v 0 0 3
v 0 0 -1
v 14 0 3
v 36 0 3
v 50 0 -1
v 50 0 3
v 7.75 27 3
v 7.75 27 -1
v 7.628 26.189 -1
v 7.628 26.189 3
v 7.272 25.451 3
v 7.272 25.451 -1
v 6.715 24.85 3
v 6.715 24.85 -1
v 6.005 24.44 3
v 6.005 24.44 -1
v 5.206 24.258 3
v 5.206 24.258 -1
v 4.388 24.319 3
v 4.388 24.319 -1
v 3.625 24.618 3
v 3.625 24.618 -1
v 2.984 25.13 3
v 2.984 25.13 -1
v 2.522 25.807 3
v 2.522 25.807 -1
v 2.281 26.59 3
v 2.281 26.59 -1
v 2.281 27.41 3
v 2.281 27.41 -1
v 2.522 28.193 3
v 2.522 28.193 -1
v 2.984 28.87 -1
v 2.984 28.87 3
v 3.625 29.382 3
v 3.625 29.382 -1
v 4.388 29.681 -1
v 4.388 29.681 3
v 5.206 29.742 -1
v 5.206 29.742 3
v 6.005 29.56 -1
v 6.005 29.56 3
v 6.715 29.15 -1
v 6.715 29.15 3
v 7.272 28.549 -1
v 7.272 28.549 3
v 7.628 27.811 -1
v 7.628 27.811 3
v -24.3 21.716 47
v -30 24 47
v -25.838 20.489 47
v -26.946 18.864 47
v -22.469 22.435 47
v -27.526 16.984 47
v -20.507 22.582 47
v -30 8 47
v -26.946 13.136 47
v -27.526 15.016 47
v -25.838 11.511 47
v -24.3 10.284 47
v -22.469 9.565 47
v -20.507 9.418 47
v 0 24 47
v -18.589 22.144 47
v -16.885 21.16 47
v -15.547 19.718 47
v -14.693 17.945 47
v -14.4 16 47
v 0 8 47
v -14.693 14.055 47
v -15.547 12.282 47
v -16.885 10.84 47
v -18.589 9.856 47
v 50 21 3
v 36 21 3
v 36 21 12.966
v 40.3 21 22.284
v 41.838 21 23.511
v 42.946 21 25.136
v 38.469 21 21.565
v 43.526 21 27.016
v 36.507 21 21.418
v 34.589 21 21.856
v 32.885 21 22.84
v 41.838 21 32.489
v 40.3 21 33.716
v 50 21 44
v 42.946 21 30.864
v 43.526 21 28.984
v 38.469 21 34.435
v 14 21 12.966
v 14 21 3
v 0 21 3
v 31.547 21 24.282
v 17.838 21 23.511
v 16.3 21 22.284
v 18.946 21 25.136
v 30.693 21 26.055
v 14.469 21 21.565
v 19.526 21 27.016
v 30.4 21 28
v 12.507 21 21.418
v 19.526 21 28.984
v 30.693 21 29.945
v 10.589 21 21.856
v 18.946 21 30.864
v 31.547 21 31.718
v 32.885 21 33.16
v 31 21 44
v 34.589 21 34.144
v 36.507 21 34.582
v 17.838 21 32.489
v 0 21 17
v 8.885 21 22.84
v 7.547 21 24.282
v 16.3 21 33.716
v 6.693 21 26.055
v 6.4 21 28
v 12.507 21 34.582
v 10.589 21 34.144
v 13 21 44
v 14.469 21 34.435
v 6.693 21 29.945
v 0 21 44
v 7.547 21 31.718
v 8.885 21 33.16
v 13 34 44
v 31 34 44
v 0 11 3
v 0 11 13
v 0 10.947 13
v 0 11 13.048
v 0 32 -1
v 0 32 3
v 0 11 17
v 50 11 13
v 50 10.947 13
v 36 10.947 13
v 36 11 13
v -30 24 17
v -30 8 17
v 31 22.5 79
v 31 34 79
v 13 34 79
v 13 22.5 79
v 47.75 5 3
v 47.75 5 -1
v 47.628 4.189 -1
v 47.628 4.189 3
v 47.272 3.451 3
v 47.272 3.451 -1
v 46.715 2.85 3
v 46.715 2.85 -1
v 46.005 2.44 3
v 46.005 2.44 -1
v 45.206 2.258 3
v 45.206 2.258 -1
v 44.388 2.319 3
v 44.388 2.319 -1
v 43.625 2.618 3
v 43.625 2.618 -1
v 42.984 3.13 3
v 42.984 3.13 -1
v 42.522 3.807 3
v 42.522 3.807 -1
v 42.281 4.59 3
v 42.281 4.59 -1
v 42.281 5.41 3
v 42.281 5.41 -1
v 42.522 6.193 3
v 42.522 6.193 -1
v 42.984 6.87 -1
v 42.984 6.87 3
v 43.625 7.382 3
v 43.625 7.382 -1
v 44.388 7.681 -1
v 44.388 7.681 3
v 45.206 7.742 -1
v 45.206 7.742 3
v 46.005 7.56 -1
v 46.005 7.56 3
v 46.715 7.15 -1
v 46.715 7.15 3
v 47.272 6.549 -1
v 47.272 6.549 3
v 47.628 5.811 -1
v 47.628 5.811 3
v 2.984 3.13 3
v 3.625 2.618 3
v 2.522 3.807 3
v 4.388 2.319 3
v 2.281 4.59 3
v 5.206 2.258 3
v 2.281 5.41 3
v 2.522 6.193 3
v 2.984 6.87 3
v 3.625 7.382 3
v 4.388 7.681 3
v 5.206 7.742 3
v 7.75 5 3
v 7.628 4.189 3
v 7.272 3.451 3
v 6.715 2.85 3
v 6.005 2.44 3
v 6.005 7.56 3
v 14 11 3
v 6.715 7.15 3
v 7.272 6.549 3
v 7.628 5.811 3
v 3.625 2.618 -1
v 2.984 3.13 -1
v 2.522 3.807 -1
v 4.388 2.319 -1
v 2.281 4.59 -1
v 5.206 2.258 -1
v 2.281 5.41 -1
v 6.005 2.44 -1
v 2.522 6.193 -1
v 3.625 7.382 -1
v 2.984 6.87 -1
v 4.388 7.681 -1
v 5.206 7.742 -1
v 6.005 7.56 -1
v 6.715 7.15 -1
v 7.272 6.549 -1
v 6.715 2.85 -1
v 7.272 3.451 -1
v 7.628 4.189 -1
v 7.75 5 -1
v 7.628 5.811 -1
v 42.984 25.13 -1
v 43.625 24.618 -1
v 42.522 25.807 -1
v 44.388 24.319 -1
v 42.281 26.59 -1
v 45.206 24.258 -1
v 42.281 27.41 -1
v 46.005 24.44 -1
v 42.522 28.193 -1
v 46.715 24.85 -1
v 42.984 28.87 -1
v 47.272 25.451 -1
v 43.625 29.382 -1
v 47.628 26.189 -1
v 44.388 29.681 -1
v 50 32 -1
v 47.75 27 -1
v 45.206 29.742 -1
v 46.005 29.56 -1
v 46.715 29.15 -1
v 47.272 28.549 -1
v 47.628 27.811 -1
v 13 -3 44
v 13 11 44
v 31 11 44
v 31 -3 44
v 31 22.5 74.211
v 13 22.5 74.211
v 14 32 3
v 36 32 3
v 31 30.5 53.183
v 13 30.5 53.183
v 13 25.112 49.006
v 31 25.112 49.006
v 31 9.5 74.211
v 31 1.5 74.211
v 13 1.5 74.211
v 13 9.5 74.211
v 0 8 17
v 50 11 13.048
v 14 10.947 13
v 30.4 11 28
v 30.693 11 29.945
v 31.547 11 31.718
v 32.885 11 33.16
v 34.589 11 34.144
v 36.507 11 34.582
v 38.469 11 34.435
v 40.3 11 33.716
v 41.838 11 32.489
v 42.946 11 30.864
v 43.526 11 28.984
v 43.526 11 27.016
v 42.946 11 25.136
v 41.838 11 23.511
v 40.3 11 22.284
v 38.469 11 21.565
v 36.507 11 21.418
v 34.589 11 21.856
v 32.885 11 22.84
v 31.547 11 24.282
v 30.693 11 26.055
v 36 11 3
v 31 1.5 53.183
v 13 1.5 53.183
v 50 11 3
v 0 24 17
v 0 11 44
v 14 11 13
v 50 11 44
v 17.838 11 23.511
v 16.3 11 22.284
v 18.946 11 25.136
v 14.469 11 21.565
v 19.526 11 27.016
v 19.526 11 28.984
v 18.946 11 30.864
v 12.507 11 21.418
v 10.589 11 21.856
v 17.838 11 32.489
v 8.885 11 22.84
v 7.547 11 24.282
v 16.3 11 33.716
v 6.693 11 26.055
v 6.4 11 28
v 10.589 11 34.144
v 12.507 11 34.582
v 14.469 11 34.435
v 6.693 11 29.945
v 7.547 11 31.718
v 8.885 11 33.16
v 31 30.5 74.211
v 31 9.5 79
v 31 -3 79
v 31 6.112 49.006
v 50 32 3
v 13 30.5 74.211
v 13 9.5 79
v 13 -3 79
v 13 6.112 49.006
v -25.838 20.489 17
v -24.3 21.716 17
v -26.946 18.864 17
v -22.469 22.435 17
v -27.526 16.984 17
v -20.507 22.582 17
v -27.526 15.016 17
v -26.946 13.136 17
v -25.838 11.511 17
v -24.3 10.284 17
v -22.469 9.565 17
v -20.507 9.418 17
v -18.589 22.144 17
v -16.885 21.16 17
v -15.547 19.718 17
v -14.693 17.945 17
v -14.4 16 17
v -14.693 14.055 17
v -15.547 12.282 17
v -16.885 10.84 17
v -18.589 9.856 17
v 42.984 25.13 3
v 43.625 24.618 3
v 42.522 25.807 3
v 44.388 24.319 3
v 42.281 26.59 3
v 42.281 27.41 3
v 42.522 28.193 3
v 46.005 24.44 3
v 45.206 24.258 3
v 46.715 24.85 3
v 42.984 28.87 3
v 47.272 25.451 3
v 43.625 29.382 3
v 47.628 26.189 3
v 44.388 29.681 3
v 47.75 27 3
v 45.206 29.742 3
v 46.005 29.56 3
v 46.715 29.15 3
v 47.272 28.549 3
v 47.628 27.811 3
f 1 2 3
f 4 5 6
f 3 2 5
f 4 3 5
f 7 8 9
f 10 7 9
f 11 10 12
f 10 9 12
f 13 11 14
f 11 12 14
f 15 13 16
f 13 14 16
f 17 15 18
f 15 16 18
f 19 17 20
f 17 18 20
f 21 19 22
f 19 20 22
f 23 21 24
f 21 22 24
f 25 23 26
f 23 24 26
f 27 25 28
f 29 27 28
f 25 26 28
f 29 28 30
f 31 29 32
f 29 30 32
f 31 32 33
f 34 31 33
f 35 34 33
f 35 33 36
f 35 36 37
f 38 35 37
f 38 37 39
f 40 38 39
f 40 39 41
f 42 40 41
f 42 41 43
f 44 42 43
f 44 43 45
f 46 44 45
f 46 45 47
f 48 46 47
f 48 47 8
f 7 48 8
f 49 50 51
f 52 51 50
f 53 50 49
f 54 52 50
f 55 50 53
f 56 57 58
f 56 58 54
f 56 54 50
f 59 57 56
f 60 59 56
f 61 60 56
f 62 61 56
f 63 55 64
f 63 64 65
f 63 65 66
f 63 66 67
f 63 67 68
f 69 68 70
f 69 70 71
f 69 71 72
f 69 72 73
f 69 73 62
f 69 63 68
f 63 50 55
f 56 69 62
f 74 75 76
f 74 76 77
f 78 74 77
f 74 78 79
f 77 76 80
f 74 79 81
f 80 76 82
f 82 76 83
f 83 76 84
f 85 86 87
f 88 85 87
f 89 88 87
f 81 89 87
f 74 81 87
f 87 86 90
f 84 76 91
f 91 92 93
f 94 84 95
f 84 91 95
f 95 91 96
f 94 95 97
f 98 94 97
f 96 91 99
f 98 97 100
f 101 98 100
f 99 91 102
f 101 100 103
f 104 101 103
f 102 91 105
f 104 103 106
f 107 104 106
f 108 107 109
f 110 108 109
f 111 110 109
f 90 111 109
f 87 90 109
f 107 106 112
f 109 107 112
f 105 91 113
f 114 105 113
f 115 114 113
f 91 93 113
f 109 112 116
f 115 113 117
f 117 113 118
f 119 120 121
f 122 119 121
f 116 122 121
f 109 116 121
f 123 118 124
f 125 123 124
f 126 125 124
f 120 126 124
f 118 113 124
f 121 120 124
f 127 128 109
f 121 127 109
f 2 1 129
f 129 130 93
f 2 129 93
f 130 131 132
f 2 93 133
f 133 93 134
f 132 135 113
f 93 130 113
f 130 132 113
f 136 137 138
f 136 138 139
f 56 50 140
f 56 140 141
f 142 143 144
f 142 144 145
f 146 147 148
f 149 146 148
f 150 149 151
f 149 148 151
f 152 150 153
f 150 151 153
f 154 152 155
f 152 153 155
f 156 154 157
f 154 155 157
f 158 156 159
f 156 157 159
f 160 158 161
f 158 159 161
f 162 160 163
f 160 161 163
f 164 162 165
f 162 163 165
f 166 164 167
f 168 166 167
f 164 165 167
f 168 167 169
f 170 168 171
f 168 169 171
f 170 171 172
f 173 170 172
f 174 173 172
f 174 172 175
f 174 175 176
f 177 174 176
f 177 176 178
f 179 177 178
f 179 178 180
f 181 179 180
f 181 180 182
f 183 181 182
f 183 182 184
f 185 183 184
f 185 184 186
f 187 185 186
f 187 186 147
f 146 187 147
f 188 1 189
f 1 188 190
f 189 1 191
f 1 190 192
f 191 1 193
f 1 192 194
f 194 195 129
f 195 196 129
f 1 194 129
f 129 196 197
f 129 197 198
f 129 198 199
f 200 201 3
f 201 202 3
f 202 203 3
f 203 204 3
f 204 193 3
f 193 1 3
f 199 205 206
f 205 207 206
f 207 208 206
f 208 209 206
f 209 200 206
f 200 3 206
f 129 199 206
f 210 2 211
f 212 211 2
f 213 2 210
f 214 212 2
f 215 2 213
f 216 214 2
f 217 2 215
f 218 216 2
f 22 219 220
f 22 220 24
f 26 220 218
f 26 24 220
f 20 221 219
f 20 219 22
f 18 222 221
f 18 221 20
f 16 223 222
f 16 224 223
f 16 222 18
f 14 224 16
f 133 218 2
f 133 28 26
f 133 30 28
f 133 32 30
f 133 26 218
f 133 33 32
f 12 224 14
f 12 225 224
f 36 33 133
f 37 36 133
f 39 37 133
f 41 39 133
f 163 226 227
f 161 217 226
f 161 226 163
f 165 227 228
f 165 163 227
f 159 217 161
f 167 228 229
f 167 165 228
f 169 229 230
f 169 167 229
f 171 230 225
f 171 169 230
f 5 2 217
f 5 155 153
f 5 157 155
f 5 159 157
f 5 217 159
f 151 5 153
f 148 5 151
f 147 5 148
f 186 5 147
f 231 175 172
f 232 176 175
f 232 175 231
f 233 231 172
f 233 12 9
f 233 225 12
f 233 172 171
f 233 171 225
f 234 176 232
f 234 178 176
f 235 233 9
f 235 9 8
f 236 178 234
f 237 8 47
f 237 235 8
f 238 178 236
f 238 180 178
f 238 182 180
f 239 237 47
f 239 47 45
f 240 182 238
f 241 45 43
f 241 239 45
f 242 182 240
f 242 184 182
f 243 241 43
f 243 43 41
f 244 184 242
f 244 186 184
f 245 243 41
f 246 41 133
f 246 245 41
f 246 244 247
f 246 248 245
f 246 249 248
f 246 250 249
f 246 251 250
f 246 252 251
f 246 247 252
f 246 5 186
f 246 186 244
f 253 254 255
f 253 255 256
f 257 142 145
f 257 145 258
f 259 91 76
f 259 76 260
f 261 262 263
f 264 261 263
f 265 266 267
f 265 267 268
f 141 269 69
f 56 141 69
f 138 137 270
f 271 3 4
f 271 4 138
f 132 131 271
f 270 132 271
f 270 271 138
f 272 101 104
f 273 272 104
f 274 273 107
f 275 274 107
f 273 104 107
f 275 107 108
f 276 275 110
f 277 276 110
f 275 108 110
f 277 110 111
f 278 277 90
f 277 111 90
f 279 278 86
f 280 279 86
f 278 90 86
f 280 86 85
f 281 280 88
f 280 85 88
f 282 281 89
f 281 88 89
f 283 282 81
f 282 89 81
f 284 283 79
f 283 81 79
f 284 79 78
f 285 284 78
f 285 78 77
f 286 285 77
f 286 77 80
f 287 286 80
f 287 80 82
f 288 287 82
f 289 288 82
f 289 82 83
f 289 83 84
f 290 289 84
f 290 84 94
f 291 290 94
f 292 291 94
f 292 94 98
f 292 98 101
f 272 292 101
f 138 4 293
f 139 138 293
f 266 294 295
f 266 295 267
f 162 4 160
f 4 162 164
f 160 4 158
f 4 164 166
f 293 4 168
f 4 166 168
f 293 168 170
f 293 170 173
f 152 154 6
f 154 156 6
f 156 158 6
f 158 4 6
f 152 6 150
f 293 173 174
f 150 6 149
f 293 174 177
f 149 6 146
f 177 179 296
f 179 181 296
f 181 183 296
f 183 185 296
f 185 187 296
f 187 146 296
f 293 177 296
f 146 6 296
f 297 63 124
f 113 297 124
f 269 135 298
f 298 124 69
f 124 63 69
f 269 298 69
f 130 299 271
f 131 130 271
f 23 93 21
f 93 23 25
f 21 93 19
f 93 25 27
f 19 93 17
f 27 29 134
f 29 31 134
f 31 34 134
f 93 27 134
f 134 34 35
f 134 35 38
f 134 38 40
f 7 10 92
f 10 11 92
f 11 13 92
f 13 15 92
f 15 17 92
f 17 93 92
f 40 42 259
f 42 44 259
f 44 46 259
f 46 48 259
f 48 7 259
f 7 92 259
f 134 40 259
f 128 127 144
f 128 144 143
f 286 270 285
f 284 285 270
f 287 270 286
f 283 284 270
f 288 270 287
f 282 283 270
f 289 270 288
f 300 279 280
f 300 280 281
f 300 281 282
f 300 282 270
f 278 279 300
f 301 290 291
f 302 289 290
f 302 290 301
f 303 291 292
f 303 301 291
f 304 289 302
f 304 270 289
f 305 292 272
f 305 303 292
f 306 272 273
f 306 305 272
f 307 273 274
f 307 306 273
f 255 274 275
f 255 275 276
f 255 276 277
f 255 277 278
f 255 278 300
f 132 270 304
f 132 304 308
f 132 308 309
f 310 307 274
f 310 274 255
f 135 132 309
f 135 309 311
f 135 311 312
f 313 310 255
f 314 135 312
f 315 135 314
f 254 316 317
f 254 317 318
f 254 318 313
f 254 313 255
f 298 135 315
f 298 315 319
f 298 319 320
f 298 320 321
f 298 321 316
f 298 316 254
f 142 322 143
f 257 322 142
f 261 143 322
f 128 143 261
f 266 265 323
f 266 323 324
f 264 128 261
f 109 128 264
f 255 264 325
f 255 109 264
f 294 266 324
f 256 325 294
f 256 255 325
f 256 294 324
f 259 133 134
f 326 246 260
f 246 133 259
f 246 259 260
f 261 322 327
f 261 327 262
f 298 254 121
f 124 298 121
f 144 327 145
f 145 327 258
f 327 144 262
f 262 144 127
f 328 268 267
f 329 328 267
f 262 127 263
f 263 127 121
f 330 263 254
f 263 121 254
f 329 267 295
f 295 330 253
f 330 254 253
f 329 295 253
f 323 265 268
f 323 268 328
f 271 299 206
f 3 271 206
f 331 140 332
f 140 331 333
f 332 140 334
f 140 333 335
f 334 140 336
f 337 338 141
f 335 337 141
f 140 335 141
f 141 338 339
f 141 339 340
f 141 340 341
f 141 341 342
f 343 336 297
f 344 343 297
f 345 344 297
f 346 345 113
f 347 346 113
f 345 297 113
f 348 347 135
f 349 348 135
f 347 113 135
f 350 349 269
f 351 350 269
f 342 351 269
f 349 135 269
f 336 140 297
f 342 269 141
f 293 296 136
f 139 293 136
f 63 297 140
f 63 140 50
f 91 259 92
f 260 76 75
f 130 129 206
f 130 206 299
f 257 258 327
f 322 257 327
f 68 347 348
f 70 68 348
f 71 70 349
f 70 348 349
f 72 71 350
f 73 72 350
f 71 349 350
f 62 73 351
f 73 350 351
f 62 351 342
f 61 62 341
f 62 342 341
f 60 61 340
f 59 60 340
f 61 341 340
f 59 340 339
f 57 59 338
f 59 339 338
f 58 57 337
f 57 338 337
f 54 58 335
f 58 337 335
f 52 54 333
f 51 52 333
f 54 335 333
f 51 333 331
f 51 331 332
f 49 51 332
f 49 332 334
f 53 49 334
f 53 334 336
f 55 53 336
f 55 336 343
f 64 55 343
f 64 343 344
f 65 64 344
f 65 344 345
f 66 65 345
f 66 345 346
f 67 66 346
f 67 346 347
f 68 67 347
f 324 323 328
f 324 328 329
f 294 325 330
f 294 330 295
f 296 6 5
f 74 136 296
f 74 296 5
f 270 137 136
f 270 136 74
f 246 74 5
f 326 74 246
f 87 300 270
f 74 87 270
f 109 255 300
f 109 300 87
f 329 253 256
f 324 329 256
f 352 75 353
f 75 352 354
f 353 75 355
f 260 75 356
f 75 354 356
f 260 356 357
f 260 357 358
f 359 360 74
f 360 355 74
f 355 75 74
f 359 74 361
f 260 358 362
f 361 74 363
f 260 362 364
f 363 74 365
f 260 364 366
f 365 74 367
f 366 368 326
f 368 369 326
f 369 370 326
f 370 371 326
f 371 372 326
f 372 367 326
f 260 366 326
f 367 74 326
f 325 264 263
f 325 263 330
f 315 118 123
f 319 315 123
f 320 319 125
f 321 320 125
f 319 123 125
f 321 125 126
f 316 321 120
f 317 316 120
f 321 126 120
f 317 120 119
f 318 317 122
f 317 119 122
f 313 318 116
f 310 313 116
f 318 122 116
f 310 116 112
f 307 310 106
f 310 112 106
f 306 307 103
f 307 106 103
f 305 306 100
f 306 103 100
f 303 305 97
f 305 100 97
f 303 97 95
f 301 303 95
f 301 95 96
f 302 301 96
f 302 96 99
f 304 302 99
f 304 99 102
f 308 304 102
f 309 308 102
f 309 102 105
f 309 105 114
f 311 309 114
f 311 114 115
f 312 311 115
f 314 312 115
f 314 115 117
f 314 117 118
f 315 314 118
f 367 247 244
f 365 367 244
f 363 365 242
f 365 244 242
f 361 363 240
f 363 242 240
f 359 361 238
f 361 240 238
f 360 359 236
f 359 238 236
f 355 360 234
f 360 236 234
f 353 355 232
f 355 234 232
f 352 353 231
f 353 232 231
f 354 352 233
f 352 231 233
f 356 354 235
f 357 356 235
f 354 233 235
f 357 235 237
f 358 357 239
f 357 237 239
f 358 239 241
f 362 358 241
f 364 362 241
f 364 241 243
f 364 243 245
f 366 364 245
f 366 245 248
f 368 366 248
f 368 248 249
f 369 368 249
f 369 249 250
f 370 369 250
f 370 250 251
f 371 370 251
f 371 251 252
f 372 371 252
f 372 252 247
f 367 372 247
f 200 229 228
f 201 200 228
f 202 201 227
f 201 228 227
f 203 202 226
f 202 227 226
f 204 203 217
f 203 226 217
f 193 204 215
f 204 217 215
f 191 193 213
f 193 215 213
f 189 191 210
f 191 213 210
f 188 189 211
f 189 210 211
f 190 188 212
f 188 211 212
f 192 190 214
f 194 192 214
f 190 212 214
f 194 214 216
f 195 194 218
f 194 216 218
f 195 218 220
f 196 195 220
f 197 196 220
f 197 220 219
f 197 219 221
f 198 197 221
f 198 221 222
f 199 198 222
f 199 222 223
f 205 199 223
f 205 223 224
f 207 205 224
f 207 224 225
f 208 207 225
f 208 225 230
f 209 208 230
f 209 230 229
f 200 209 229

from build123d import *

# Parameters (mm, degrees)
PAD005_DEPTH  = 50
PAD006_DEPTH  = 50
SKETCH013_R   = 6.6
PAD011_DEPTH  = 30
SKETCH014_R   = 6.6
PAD012_DEPTH  = 35
SKETCH009_W   = 11
SKETCH009_H   = 10
PAD007_DEPTH  = 14
SKETCH010_W   = 11
SKETCH010_H   = 10
PAD008_DEPTH  = 14
SKETCH011_W   = 11
SKETCH011_H   = 10
PAD009_DEPTH  = 14
SKETCH012_W   = 11
SKETCH012_H   = 10
PAD010_DEPTH  = 14
SKETCH001_W   = 32
SKETCH001_H   = 4
PAD001_DEPTH  = 50
SKETCH004_R   = 2.75
HOLE_DEPTH    = 4.001
PAD003_DEPTH  = 20
SKETCH002_W   = 37
SKETCH002_H   = 18
PAD002_DEPTH  = 35
SKETCH005_W   = 16
SKETCH005_H   = 30
PAD004_DEPTH  = 30
SKETCH006_R   = 6.6
HOLE001_DEPTH = 30.001
SKETCH_W      = 32
SKETCH_H      = 41
PAD_DEPTH     = 50


with BuildPart() as body005:
    # Sketch007 (on Face1 of CopyPad004) → Pad005 (new body)
    with BuildSketch(Plane(origin=(0, 0, 0), x_dir=(0, -1, 0), z_dir=(-1, 0, 0))):
        Polygon((0, 3), (-11, 13.048009), (-11, 44), (0, 44), align=None)
    extrude(amount=-PAD005_DEPTH)


with BuildPart() as body006:
    # Sketch008 (on Face1 of CopyPad005) → Pad006 (new body)
    with BuildSketch(Plane(origin=(0, 0, 0), x_dir=(0, -1, 0), z_dir=(-1, 0, 0))):
        Polygon((-32, 44), (-21, 44), (-21, 12.966247), (-32, 3), align=None)
    extrude(amount=-PAD006_DEPTH)


with BuildPart() as body011:
    # Sketch013 (on Face1 of CopyPad006001) → Pad011 (new body)
    with BuildSketch(Plane(origin=(0, 32, 0), x_dir=(-1, 0, 0), z_dir=(0, 1, 0))):
        with Locations((-37, 28)):
            Circle(SKETCH013_R)
    extrude(amount=-PAD011_DEPTH)


with BuildPart() as body012:
    # Sketch014 (on Face1 of CopyPad006002) → Pad012 (new body)
    with BuildSketch(Plane(origin=(0, 32, 0), x_dir=(-1, 0, 0), z_dir=(0, 1, 0))):
        with Locations((-13, 28)):
            Circle(SKETCH014_R)
    extrude(amount=-PAD012_DEPTH)


with BuildPart() as body007:
    # Sketch009 (on Face1 of CopyPad006) → Pad007 (new body)
    with BuildSketch(Plane.YZ.offset(50)):
        with Locations((26.5, 8)):
            Rectangle(SKETCH009_W, SKETCH009_H)
    extrude(amount=-PAD007_DEPTH)


with BuildPart() as body008:
    # Sketch010 (on Face1 of CopyPad005001) → Pad008 (new body)
    with BuildSketch(Plane.YZ.offset(50)):
        with Locations((5.5, 8)):
            Rectangle(SKETCH010_W, SKETCH010_H)
    extrude(amount=-PAD008_DEPTH)


with BuildPart() as body009:
    # Sketch011 (on Face1 of CopyPad005002) → Pad009 (new body)
    with BuildSketch(Plane(origin=(0, 0, 0), x_dir=(0, -1, 0), z_dir=(-1, 0, 0))):
        with Locations((-5.5, 8)):
            Rectangle(SKETCH011_W, SKETCH011_H)
    extrude(amount=-PAD009_DEPTH)


with BuildPart() as body010:
    # Sketch012 (on Face1 of CopyPad005003) → Pad010 (new body)
    with BuildSketch(Plane(origin=(0, 0, 0), x_dir=(0, -1, 0), z_dir=(-1, 0, 0))):
        with Locations((-26.5, 8)):
            Rectangle(SKETCH012_W, SKETCH012_H)
    extrude(amount=-PAD010_DEPTH)


with BuildPart() as body001:
    # Sketch001 (on Face1 of CopyPad) → Pad001 (new body)
    with BuildSketch(Plane.YZ.offset(50)):
        with Locations((16, 1)):
            Rectangle(SKETCH001_W, SKETCH001_H)
    extrude(amount=-PAD001_DEPTH)

    # Sketch004 (on Face3 of Pad001) → Hole (cut, through all)
    with BuildSketch(Plane(origin=(50, 0, -1), x_dir=(1, 0, 0), z_dir=(0, 0, -1))):
        with Locations((-45, -5)):
            Circle(SKETCH004_R)
        with Locations((-5, -5)):
            Circle(SKETCH004_R)
        with Locations((-5, -27)):
            Circle(SKETCH004_R)
        with Locations((-45, -27)):
            Circle(SKETCH004_R)
    extrude(amount=-HOLE_DEPTH, mode=Mode.SUBTRACT)


with BuildPart() as body003:
    # Sketch003 (on Face1 of CopyPad002) → Pad003 (new body)
    with BuildSketch(Plane.YZ.offset(31)):
        Polygon((9.5, 79.211134), (22.5, 79.211134), (22.5, 74.211134), (30.5, 74.211134), (30.5, 53.183285), (25.112084, 49.00605), (6.112084, 49.00605), (1.5, 53.183285), (1.5, 74.211134), (9.5, 74.211134), align=None)
    extrude(amount=-PAD003_DEPTH)


with BuildPart() as body002:
    # Sketch002 (on Face1 of CopyPad001) → Pad002 (new body)
    with BuildSketch(Plane(origin=(0, 0, 44), x_dir=(0, -1, 0), z_dir=(0, 0, 1))):
        with Locations((-15.5, 22)):
            Rectangle(SKETCH002_W, SKETCH002_H)
    extrude(amount=PAD002_DEPTH)

    # Boolean: cut Body003
    add(body003.part, mode=Mode.SUBTRACT)


with BuildPart() as body004:
    # Sketch005 (on Face1 of CopyPad003) → Pad004 (new body)
    with BuildSketch(Plane(origin=(0, 0, 0), x_dir=(0, -1, 0), z_dir=(-1, 0, 0))):
        with Locations((-16, 32)):
            Rectangle(SKETCH005_W, SKETCH005_H)
    extrude(amount=PAD004_DEPTH)

    # Sketch006 (on Face3 of Pad004) → Hole001 (cut, through all)
    with BuildSketch(Plane(origin=(0, 0, 17), x_dir=(1, 0, 0), z_dir=(0, 0, -1))):
        with Locations((-21, -16)):
            Circle(SKETCH006_R)
    extrude(amount=-HOLE001_DEPTH, mode=Mode.SUBTRACT)


with BuildPart() as body:
    # Sketch → Pad (new body)
    with BuildSketch(Plane.YZ):
        with Locations((16, 23.5)):
            Rectangle(SKETCH_W, SKETCH_H)
    extrude(amount=PAD_DEPTH)

    # Boolean001: cut Body005
    add(body005.part, mode=Mode.SUBTRACT)

    # Boolean002: cut Body006
    add(body006.part, mode=Mode.SUBTRACT)

    # Boolean003: cut Body011
    add(body011.part, mode=Mode.SUBTRACT)

    # Boolean004: cut Body012
    add(body012.part, mode=Mode.SUBTRACT)

    # Boolean005: cut Body007
    add(body007.part, mode=Mode.SUBTRACT)

    # Boolean006: cut Body008
    add(body008.part, mode=Mode.SUBTRACT)

    # Boolean007: cut Body009
    add(body009.part, mode=Mode.SUBTRACT)

    # Boolean008: cut Body010
    add(body010.part, mode=Mode.SUBTRACT)

    # Boolean009: union Body001
    add(body001.part)

    # Boolean010: union Body002
    add(body002.part)

    # Boolean011: union Body004
    add(body004.part)


solid = body.part
